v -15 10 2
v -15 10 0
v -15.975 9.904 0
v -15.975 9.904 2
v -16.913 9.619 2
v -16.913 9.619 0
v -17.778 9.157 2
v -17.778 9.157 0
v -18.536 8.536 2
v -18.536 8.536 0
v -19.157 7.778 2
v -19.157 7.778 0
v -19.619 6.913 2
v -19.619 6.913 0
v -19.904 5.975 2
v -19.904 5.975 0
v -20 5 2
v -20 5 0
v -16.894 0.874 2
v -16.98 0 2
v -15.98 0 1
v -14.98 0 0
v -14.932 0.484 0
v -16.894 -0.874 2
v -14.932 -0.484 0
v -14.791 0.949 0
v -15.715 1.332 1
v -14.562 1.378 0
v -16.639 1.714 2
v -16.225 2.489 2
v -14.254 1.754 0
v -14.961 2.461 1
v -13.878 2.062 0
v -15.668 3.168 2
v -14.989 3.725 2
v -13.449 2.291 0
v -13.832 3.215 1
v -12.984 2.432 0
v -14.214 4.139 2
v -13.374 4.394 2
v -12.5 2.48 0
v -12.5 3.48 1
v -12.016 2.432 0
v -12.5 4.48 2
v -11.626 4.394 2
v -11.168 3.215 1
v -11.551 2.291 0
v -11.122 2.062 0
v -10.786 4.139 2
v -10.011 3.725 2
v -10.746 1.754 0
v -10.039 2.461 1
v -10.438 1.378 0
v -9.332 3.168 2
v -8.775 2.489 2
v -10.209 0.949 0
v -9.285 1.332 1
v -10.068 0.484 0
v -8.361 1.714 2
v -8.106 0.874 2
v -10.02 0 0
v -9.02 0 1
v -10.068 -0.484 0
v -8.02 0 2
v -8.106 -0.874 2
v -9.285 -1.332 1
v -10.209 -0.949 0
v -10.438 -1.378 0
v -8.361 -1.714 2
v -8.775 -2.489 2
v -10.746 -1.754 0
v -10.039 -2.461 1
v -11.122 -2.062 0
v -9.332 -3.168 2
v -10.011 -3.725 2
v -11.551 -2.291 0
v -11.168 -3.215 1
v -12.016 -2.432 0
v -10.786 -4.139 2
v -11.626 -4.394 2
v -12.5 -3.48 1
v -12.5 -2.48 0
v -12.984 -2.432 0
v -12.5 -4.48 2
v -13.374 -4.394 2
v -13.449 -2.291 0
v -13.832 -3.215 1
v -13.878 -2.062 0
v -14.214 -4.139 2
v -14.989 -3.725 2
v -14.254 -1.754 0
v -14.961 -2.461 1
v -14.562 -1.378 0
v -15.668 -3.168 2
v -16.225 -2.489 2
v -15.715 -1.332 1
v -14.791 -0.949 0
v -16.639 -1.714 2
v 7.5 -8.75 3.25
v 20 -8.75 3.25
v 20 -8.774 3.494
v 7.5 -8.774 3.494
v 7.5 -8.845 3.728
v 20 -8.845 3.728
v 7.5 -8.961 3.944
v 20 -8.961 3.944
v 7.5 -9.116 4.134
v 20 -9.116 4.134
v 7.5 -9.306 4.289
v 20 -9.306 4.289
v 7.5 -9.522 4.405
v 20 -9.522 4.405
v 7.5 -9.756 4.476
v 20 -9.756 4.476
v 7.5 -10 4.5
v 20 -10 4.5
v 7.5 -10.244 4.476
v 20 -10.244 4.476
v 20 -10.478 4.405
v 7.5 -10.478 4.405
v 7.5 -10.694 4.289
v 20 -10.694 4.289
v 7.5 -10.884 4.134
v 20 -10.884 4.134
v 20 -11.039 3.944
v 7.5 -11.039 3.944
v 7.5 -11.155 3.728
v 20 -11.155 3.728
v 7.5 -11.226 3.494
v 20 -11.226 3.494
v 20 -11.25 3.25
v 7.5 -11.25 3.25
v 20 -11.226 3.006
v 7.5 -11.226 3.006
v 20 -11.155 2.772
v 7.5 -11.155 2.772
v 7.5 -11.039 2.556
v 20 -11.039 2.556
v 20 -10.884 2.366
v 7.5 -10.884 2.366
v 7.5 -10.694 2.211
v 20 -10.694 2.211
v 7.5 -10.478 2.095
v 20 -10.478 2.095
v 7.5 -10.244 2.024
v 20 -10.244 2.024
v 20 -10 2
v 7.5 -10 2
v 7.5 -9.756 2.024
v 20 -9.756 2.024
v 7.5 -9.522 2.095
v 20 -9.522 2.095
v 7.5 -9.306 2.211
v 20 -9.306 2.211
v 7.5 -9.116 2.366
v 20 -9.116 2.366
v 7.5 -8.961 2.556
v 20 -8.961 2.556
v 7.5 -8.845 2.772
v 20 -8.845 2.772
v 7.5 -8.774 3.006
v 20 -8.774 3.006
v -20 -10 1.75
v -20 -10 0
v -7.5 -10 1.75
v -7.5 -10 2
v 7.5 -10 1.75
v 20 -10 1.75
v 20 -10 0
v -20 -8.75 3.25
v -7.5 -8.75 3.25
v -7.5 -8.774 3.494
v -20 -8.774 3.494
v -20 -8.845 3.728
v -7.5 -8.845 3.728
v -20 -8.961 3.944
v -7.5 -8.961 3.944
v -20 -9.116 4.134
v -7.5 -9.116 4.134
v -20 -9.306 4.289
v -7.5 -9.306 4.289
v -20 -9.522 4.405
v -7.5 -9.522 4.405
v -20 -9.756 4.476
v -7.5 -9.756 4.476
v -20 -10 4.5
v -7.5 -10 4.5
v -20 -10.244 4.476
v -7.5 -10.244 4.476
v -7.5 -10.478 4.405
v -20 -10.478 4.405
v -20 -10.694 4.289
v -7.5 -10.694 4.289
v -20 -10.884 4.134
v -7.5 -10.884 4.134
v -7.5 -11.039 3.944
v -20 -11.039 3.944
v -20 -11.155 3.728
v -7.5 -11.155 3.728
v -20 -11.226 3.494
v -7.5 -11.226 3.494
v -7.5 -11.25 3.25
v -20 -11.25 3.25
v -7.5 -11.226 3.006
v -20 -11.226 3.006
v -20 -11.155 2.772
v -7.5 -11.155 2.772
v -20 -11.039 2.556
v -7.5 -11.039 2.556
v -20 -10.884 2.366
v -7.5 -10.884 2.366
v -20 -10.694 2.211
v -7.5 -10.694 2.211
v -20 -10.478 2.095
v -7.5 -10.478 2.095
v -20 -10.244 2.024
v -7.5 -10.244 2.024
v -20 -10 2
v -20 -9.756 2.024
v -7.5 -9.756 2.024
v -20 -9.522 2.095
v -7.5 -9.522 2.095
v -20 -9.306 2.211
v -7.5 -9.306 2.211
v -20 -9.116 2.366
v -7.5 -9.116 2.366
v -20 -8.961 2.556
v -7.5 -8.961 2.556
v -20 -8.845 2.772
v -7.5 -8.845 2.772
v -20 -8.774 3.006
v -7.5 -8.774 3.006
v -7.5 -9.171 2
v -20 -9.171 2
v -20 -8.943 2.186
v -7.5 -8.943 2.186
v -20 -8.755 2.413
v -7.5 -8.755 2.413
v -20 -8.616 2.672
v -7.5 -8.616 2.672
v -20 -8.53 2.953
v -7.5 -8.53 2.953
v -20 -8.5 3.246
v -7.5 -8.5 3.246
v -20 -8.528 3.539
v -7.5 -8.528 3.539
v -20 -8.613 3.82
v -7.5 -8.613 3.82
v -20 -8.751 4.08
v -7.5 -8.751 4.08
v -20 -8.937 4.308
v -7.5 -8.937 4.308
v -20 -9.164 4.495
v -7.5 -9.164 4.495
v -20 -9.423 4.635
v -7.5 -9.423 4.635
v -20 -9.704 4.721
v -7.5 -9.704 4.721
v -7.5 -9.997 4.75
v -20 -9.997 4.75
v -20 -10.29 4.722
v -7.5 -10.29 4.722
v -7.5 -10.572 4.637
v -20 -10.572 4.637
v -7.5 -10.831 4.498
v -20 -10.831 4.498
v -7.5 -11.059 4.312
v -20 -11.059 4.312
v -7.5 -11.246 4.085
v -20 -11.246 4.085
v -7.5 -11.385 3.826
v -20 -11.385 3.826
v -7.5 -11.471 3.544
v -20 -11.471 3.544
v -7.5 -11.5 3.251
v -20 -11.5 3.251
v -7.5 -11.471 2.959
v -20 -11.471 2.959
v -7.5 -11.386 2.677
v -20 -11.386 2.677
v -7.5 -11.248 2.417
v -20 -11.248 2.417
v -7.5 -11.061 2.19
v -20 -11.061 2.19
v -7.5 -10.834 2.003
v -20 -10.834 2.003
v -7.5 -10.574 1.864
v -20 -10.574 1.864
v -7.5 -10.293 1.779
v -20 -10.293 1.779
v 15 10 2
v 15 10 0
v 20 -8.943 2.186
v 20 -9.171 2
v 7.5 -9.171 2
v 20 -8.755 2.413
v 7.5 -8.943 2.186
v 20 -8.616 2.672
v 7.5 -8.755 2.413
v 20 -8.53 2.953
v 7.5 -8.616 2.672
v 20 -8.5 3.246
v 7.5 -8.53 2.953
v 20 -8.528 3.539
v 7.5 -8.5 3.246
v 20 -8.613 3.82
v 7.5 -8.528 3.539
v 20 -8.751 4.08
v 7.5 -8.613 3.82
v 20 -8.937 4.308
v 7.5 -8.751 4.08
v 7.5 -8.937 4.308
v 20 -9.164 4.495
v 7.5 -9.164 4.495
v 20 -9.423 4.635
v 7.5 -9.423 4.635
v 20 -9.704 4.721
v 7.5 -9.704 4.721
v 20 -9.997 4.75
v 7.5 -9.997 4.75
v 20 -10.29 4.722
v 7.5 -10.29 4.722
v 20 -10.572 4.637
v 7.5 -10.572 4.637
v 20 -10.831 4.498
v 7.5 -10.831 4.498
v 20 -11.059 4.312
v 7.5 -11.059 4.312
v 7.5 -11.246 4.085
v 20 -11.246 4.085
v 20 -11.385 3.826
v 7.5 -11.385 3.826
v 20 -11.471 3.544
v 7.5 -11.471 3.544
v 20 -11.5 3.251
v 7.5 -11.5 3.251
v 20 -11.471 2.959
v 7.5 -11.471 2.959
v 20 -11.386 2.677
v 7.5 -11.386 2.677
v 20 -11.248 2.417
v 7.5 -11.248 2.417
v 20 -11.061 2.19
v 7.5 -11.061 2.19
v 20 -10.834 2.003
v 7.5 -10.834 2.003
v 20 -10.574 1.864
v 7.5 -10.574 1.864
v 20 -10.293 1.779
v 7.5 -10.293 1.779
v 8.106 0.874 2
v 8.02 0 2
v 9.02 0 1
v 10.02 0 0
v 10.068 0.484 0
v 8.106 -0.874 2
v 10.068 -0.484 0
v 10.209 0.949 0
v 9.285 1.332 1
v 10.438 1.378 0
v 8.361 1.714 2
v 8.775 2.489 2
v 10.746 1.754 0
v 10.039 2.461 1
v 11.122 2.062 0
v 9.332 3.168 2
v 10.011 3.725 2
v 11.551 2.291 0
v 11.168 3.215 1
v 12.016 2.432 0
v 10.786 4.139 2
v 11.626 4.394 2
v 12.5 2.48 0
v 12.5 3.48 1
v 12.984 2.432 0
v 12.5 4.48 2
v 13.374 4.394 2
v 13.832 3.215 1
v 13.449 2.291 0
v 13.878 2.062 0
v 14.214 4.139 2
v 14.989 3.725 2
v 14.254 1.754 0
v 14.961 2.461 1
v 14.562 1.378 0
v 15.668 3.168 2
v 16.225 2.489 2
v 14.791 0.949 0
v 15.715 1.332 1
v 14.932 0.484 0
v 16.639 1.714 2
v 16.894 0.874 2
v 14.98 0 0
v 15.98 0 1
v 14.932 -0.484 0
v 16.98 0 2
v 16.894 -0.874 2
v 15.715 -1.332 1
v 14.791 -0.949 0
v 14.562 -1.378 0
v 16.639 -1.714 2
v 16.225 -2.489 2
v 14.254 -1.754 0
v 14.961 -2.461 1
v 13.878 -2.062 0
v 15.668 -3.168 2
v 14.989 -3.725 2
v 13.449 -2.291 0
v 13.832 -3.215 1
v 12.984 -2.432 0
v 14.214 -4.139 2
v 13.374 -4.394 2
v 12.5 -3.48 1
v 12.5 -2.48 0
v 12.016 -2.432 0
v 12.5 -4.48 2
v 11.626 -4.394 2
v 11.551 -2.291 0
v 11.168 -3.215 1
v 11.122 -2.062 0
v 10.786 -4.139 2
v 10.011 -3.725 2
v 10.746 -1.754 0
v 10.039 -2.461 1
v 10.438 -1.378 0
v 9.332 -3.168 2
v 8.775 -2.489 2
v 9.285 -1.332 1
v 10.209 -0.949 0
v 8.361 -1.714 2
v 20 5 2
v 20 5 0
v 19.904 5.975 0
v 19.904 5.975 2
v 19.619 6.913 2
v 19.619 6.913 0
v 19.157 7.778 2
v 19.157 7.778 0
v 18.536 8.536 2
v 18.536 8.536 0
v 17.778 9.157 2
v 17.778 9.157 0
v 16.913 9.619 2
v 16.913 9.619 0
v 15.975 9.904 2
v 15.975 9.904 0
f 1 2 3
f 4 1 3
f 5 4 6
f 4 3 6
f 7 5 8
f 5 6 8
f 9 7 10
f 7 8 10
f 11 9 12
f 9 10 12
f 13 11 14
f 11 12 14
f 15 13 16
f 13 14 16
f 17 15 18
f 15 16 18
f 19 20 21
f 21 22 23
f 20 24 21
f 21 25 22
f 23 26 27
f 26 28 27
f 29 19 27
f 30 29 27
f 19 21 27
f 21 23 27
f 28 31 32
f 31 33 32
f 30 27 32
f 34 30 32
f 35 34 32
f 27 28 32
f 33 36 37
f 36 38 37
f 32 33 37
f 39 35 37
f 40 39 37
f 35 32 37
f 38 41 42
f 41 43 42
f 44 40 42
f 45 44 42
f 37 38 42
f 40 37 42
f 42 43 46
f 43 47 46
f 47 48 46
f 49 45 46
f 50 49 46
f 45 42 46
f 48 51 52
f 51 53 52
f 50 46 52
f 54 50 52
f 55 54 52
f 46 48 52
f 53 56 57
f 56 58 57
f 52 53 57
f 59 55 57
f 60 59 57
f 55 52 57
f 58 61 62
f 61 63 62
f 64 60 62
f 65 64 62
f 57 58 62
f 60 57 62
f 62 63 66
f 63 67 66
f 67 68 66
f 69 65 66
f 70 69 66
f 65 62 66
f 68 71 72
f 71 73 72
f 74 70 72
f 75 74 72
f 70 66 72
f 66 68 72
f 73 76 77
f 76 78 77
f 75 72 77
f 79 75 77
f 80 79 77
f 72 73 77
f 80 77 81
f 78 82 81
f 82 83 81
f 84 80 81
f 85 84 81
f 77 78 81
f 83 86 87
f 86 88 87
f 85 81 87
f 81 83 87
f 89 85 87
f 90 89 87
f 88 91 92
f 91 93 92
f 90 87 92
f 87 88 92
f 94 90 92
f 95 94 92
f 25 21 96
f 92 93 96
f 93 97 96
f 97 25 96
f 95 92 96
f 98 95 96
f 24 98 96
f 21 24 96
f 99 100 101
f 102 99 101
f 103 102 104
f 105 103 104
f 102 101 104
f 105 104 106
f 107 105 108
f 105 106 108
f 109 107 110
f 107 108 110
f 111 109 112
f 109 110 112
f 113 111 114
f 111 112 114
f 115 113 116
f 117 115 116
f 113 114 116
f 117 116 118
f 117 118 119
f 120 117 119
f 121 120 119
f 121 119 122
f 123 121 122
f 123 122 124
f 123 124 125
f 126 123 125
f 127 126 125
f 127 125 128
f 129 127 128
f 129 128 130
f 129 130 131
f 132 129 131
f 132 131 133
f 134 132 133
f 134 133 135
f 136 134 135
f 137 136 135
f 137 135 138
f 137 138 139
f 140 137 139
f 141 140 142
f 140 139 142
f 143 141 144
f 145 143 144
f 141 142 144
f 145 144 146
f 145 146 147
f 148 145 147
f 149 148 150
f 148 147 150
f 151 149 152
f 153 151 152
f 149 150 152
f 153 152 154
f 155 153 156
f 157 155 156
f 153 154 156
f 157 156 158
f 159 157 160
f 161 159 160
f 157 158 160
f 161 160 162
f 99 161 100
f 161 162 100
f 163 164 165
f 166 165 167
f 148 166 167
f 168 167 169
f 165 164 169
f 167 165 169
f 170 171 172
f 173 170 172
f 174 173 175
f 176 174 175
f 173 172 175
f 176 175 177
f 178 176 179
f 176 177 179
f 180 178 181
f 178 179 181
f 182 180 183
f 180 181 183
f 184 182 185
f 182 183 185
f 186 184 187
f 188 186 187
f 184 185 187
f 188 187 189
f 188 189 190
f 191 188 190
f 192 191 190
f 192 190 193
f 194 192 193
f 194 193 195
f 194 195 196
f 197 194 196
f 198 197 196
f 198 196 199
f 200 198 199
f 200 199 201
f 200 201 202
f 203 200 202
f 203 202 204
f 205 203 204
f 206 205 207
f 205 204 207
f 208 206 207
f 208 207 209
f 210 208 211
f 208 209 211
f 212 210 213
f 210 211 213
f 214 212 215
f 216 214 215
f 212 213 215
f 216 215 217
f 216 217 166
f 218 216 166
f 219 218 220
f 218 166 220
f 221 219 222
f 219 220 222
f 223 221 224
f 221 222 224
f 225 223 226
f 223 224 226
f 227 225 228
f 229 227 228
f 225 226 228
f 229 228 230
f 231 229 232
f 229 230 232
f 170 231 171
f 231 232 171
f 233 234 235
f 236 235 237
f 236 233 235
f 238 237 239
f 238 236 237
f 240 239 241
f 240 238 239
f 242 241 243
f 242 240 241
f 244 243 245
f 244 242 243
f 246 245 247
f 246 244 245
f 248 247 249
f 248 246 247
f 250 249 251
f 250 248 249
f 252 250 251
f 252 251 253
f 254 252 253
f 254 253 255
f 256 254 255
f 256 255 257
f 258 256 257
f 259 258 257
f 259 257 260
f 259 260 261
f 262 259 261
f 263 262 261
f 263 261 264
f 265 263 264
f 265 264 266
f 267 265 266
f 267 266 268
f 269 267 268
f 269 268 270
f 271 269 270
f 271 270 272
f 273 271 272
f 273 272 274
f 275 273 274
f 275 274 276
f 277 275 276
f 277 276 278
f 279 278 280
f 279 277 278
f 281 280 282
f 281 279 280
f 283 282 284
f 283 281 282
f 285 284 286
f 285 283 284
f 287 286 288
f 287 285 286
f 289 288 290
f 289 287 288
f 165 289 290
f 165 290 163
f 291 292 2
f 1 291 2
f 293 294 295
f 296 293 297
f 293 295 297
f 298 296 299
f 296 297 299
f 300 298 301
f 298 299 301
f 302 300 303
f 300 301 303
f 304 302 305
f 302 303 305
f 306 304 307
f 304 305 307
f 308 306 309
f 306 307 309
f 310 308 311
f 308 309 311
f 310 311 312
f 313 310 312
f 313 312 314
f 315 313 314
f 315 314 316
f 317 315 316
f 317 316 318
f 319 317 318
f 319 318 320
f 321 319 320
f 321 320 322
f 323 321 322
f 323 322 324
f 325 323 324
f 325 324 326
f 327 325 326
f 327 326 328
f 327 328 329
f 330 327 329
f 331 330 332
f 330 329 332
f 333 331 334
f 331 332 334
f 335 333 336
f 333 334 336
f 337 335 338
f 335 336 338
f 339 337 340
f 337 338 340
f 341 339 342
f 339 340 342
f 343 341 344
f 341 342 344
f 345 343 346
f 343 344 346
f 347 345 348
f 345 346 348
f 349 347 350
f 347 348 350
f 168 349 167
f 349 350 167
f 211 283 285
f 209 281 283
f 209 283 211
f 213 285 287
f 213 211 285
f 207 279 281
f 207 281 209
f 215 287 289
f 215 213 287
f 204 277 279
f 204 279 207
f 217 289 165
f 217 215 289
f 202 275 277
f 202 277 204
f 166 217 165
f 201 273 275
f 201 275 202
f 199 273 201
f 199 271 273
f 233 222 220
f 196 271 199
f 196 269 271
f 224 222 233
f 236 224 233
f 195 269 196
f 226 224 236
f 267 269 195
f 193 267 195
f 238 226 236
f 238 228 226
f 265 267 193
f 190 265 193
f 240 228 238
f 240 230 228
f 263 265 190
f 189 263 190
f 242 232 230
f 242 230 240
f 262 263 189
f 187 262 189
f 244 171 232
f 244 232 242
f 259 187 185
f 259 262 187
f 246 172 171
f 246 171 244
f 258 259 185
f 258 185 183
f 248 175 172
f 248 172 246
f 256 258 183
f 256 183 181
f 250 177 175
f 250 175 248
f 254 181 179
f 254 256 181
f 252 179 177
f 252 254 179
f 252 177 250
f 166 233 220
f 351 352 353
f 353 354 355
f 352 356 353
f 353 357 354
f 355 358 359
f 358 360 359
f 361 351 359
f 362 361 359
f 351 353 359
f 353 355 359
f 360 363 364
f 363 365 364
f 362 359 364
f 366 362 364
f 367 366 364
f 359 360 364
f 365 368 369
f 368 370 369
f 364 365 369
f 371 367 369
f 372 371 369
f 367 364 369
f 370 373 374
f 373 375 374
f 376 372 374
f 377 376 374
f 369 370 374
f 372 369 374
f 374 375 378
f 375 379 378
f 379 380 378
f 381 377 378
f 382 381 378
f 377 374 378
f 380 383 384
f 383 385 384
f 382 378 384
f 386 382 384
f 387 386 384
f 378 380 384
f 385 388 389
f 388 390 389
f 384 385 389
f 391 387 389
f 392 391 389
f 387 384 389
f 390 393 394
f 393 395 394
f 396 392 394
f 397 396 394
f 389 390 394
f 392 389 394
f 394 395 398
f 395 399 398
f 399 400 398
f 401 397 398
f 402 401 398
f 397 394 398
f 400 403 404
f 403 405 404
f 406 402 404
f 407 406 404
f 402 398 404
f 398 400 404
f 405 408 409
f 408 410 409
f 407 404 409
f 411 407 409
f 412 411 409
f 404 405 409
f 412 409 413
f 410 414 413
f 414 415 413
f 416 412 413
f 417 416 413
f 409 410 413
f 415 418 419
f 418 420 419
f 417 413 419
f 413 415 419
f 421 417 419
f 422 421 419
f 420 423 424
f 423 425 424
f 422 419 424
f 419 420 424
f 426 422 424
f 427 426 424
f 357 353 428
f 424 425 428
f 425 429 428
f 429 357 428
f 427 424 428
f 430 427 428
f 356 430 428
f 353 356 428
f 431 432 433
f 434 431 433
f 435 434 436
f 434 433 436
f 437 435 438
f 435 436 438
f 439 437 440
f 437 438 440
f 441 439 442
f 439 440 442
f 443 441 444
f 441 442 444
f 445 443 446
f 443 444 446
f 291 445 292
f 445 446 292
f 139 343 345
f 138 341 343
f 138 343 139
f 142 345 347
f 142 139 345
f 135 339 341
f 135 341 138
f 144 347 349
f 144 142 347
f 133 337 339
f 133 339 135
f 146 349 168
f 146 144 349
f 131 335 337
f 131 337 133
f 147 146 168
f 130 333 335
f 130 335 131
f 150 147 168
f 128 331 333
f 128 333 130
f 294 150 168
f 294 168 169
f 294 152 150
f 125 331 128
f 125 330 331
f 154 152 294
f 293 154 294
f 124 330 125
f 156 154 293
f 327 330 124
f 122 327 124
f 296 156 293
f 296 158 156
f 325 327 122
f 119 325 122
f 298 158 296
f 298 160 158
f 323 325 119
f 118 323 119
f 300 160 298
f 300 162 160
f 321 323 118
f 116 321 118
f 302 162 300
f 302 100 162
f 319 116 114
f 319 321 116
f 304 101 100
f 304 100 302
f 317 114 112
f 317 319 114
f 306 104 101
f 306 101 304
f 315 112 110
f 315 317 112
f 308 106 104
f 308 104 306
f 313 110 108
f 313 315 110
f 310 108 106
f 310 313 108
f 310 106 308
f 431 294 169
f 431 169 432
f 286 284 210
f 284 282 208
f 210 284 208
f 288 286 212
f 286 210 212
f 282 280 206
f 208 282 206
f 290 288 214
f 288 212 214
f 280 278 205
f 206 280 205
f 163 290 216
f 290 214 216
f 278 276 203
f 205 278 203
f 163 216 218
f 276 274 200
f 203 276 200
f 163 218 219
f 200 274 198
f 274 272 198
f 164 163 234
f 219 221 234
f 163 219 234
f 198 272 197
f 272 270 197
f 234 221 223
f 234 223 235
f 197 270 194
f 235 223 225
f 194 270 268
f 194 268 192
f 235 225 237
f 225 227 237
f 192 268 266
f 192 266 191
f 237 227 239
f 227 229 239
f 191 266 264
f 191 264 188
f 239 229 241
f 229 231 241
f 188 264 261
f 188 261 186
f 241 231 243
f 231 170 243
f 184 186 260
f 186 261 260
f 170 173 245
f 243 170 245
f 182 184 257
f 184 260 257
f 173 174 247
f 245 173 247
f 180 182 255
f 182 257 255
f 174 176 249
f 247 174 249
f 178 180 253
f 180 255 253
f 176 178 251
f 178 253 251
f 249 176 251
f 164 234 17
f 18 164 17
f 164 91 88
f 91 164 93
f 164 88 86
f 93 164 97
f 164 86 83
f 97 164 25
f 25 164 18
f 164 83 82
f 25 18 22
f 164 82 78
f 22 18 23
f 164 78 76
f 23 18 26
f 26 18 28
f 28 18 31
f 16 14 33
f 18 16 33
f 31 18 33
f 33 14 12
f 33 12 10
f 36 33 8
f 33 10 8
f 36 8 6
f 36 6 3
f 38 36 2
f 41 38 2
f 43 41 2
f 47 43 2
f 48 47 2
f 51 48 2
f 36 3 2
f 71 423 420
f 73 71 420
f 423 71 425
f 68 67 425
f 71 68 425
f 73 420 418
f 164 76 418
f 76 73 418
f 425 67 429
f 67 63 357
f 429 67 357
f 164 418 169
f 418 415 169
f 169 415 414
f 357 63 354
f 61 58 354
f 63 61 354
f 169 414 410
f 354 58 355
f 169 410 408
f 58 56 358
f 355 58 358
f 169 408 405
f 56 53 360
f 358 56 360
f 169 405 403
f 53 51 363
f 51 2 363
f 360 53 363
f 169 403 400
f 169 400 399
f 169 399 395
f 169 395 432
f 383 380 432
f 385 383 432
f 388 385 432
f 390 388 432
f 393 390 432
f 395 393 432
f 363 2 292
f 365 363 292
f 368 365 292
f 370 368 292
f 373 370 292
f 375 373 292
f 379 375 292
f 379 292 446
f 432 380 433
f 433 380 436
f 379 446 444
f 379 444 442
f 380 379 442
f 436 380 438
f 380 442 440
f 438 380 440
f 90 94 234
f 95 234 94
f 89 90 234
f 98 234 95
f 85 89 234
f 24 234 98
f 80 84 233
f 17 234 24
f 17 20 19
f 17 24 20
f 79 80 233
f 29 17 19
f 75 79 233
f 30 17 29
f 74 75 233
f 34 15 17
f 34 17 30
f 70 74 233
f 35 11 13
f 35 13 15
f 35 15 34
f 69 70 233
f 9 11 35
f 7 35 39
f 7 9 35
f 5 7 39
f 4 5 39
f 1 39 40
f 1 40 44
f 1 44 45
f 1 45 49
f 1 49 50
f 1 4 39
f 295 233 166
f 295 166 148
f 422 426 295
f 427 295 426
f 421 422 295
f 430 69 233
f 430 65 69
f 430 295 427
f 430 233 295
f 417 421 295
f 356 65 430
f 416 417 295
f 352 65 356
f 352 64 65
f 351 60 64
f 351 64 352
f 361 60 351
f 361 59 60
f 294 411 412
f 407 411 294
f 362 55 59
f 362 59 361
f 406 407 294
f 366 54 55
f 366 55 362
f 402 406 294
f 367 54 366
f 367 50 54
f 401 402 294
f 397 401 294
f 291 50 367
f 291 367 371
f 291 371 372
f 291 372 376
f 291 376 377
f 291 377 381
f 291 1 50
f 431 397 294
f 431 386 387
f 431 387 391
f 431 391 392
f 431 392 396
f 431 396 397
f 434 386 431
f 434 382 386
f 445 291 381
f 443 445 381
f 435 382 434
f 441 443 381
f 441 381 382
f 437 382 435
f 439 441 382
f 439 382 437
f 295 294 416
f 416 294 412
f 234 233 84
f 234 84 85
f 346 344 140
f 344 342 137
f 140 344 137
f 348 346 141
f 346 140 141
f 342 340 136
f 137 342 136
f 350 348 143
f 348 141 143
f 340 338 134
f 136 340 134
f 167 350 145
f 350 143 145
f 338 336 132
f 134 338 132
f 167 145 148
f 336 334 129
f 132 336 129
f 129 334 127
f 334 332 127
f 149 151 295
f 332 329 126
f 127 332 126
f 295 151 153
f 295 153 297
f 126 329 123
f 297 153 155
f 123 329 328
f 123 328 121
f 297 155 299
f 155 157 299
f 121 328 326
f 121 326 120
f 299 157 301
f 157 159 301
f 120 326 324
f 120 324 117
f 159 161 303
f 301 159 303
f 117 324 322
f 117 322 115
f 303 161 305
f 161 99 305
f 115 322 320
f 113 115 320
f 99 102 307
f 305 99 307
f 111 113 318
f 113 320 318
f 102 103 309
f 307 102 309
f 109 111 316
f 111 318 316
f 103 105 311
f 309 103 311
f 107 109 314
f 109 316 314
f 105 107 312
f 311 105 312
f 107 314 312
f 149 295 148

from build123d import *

# Parameters (mm, degrees)
F1_DEPTH        = 2
F3_R            = 1.5
F6_DEPTH        = 12.5
F5_R            = 1.5
F7_DEPTH        = 12.5
F8_R            = 1.25
F9_DEPTH        = 40
F11_D           = 4.4
F11_DEPTH       = 14.1
F11_CSINK_D     = 8.96
F11_CSINK_ANGLE = 90
F11_TIP         = 1.3218933619


with BuildPart() as f1:
    # F0 (on Top) → F1 (new body)
    with BuildSketch(Plane.XY):
        with BuildLine():
            ThreePointArc((20, 5), (18.5355339059, 8.5355339059), (15, 10))
            Line((15, 10), (-15, 10))
            ThreePointArc((-15, 10), (-18.5355339059, 8.5355339059), (-20, 5))
            Line((-20, 5), (-20, -10))
            Line((-20, -10), (20, -10))
            Line((20, -10), (20, 5))
        make_face()
    extrude(amount=F1_DEPTH)

    # F3 (on offset) → F6 (join, through all)
    with BuildSketch(Plane.YZ.offset(7.5)):
        with Locations((-10, 3.25)):
            Circle(F3_R)
    extrude(amount=F6_DEPTH)

    # F5 (on offset) → F7 (join, through all)
    with BuildSketch(Plane.YZ.offset(-7.5)):
        with Locations((-10, 3.25)):
            Circle(F5_R)
    extrude(amount=-F7_DEPTH)

    # F8 (on face) → F9 (cut, through all)
    with BuildSketch(Plane.YZ.offset(20)):
        with Locations((-10, 3.25)):
            Circle(F8_R)
    extrude(amount=-F9_DEPTH, mode=Mode.SUBTRACT)

    # F11
    with Locations(Plane.XY.offset(2)):
        with Locations((-12.5, 0), (12.5, 0)):
            CounterSinkHole(F11_D / 2, F11_CSINK_D / 2, depth=F11_DEPTH, counter_sink_angle=F11_CSINK_ANGLE)
            with Locations((0, 0, -(F11_DEPTH + F11_TIP / 2))):  # 118° drill point
                Cone(0, F11_D / 2, F11_TIP, mode=Mode.SUBTRACT)


solid = f1.part
